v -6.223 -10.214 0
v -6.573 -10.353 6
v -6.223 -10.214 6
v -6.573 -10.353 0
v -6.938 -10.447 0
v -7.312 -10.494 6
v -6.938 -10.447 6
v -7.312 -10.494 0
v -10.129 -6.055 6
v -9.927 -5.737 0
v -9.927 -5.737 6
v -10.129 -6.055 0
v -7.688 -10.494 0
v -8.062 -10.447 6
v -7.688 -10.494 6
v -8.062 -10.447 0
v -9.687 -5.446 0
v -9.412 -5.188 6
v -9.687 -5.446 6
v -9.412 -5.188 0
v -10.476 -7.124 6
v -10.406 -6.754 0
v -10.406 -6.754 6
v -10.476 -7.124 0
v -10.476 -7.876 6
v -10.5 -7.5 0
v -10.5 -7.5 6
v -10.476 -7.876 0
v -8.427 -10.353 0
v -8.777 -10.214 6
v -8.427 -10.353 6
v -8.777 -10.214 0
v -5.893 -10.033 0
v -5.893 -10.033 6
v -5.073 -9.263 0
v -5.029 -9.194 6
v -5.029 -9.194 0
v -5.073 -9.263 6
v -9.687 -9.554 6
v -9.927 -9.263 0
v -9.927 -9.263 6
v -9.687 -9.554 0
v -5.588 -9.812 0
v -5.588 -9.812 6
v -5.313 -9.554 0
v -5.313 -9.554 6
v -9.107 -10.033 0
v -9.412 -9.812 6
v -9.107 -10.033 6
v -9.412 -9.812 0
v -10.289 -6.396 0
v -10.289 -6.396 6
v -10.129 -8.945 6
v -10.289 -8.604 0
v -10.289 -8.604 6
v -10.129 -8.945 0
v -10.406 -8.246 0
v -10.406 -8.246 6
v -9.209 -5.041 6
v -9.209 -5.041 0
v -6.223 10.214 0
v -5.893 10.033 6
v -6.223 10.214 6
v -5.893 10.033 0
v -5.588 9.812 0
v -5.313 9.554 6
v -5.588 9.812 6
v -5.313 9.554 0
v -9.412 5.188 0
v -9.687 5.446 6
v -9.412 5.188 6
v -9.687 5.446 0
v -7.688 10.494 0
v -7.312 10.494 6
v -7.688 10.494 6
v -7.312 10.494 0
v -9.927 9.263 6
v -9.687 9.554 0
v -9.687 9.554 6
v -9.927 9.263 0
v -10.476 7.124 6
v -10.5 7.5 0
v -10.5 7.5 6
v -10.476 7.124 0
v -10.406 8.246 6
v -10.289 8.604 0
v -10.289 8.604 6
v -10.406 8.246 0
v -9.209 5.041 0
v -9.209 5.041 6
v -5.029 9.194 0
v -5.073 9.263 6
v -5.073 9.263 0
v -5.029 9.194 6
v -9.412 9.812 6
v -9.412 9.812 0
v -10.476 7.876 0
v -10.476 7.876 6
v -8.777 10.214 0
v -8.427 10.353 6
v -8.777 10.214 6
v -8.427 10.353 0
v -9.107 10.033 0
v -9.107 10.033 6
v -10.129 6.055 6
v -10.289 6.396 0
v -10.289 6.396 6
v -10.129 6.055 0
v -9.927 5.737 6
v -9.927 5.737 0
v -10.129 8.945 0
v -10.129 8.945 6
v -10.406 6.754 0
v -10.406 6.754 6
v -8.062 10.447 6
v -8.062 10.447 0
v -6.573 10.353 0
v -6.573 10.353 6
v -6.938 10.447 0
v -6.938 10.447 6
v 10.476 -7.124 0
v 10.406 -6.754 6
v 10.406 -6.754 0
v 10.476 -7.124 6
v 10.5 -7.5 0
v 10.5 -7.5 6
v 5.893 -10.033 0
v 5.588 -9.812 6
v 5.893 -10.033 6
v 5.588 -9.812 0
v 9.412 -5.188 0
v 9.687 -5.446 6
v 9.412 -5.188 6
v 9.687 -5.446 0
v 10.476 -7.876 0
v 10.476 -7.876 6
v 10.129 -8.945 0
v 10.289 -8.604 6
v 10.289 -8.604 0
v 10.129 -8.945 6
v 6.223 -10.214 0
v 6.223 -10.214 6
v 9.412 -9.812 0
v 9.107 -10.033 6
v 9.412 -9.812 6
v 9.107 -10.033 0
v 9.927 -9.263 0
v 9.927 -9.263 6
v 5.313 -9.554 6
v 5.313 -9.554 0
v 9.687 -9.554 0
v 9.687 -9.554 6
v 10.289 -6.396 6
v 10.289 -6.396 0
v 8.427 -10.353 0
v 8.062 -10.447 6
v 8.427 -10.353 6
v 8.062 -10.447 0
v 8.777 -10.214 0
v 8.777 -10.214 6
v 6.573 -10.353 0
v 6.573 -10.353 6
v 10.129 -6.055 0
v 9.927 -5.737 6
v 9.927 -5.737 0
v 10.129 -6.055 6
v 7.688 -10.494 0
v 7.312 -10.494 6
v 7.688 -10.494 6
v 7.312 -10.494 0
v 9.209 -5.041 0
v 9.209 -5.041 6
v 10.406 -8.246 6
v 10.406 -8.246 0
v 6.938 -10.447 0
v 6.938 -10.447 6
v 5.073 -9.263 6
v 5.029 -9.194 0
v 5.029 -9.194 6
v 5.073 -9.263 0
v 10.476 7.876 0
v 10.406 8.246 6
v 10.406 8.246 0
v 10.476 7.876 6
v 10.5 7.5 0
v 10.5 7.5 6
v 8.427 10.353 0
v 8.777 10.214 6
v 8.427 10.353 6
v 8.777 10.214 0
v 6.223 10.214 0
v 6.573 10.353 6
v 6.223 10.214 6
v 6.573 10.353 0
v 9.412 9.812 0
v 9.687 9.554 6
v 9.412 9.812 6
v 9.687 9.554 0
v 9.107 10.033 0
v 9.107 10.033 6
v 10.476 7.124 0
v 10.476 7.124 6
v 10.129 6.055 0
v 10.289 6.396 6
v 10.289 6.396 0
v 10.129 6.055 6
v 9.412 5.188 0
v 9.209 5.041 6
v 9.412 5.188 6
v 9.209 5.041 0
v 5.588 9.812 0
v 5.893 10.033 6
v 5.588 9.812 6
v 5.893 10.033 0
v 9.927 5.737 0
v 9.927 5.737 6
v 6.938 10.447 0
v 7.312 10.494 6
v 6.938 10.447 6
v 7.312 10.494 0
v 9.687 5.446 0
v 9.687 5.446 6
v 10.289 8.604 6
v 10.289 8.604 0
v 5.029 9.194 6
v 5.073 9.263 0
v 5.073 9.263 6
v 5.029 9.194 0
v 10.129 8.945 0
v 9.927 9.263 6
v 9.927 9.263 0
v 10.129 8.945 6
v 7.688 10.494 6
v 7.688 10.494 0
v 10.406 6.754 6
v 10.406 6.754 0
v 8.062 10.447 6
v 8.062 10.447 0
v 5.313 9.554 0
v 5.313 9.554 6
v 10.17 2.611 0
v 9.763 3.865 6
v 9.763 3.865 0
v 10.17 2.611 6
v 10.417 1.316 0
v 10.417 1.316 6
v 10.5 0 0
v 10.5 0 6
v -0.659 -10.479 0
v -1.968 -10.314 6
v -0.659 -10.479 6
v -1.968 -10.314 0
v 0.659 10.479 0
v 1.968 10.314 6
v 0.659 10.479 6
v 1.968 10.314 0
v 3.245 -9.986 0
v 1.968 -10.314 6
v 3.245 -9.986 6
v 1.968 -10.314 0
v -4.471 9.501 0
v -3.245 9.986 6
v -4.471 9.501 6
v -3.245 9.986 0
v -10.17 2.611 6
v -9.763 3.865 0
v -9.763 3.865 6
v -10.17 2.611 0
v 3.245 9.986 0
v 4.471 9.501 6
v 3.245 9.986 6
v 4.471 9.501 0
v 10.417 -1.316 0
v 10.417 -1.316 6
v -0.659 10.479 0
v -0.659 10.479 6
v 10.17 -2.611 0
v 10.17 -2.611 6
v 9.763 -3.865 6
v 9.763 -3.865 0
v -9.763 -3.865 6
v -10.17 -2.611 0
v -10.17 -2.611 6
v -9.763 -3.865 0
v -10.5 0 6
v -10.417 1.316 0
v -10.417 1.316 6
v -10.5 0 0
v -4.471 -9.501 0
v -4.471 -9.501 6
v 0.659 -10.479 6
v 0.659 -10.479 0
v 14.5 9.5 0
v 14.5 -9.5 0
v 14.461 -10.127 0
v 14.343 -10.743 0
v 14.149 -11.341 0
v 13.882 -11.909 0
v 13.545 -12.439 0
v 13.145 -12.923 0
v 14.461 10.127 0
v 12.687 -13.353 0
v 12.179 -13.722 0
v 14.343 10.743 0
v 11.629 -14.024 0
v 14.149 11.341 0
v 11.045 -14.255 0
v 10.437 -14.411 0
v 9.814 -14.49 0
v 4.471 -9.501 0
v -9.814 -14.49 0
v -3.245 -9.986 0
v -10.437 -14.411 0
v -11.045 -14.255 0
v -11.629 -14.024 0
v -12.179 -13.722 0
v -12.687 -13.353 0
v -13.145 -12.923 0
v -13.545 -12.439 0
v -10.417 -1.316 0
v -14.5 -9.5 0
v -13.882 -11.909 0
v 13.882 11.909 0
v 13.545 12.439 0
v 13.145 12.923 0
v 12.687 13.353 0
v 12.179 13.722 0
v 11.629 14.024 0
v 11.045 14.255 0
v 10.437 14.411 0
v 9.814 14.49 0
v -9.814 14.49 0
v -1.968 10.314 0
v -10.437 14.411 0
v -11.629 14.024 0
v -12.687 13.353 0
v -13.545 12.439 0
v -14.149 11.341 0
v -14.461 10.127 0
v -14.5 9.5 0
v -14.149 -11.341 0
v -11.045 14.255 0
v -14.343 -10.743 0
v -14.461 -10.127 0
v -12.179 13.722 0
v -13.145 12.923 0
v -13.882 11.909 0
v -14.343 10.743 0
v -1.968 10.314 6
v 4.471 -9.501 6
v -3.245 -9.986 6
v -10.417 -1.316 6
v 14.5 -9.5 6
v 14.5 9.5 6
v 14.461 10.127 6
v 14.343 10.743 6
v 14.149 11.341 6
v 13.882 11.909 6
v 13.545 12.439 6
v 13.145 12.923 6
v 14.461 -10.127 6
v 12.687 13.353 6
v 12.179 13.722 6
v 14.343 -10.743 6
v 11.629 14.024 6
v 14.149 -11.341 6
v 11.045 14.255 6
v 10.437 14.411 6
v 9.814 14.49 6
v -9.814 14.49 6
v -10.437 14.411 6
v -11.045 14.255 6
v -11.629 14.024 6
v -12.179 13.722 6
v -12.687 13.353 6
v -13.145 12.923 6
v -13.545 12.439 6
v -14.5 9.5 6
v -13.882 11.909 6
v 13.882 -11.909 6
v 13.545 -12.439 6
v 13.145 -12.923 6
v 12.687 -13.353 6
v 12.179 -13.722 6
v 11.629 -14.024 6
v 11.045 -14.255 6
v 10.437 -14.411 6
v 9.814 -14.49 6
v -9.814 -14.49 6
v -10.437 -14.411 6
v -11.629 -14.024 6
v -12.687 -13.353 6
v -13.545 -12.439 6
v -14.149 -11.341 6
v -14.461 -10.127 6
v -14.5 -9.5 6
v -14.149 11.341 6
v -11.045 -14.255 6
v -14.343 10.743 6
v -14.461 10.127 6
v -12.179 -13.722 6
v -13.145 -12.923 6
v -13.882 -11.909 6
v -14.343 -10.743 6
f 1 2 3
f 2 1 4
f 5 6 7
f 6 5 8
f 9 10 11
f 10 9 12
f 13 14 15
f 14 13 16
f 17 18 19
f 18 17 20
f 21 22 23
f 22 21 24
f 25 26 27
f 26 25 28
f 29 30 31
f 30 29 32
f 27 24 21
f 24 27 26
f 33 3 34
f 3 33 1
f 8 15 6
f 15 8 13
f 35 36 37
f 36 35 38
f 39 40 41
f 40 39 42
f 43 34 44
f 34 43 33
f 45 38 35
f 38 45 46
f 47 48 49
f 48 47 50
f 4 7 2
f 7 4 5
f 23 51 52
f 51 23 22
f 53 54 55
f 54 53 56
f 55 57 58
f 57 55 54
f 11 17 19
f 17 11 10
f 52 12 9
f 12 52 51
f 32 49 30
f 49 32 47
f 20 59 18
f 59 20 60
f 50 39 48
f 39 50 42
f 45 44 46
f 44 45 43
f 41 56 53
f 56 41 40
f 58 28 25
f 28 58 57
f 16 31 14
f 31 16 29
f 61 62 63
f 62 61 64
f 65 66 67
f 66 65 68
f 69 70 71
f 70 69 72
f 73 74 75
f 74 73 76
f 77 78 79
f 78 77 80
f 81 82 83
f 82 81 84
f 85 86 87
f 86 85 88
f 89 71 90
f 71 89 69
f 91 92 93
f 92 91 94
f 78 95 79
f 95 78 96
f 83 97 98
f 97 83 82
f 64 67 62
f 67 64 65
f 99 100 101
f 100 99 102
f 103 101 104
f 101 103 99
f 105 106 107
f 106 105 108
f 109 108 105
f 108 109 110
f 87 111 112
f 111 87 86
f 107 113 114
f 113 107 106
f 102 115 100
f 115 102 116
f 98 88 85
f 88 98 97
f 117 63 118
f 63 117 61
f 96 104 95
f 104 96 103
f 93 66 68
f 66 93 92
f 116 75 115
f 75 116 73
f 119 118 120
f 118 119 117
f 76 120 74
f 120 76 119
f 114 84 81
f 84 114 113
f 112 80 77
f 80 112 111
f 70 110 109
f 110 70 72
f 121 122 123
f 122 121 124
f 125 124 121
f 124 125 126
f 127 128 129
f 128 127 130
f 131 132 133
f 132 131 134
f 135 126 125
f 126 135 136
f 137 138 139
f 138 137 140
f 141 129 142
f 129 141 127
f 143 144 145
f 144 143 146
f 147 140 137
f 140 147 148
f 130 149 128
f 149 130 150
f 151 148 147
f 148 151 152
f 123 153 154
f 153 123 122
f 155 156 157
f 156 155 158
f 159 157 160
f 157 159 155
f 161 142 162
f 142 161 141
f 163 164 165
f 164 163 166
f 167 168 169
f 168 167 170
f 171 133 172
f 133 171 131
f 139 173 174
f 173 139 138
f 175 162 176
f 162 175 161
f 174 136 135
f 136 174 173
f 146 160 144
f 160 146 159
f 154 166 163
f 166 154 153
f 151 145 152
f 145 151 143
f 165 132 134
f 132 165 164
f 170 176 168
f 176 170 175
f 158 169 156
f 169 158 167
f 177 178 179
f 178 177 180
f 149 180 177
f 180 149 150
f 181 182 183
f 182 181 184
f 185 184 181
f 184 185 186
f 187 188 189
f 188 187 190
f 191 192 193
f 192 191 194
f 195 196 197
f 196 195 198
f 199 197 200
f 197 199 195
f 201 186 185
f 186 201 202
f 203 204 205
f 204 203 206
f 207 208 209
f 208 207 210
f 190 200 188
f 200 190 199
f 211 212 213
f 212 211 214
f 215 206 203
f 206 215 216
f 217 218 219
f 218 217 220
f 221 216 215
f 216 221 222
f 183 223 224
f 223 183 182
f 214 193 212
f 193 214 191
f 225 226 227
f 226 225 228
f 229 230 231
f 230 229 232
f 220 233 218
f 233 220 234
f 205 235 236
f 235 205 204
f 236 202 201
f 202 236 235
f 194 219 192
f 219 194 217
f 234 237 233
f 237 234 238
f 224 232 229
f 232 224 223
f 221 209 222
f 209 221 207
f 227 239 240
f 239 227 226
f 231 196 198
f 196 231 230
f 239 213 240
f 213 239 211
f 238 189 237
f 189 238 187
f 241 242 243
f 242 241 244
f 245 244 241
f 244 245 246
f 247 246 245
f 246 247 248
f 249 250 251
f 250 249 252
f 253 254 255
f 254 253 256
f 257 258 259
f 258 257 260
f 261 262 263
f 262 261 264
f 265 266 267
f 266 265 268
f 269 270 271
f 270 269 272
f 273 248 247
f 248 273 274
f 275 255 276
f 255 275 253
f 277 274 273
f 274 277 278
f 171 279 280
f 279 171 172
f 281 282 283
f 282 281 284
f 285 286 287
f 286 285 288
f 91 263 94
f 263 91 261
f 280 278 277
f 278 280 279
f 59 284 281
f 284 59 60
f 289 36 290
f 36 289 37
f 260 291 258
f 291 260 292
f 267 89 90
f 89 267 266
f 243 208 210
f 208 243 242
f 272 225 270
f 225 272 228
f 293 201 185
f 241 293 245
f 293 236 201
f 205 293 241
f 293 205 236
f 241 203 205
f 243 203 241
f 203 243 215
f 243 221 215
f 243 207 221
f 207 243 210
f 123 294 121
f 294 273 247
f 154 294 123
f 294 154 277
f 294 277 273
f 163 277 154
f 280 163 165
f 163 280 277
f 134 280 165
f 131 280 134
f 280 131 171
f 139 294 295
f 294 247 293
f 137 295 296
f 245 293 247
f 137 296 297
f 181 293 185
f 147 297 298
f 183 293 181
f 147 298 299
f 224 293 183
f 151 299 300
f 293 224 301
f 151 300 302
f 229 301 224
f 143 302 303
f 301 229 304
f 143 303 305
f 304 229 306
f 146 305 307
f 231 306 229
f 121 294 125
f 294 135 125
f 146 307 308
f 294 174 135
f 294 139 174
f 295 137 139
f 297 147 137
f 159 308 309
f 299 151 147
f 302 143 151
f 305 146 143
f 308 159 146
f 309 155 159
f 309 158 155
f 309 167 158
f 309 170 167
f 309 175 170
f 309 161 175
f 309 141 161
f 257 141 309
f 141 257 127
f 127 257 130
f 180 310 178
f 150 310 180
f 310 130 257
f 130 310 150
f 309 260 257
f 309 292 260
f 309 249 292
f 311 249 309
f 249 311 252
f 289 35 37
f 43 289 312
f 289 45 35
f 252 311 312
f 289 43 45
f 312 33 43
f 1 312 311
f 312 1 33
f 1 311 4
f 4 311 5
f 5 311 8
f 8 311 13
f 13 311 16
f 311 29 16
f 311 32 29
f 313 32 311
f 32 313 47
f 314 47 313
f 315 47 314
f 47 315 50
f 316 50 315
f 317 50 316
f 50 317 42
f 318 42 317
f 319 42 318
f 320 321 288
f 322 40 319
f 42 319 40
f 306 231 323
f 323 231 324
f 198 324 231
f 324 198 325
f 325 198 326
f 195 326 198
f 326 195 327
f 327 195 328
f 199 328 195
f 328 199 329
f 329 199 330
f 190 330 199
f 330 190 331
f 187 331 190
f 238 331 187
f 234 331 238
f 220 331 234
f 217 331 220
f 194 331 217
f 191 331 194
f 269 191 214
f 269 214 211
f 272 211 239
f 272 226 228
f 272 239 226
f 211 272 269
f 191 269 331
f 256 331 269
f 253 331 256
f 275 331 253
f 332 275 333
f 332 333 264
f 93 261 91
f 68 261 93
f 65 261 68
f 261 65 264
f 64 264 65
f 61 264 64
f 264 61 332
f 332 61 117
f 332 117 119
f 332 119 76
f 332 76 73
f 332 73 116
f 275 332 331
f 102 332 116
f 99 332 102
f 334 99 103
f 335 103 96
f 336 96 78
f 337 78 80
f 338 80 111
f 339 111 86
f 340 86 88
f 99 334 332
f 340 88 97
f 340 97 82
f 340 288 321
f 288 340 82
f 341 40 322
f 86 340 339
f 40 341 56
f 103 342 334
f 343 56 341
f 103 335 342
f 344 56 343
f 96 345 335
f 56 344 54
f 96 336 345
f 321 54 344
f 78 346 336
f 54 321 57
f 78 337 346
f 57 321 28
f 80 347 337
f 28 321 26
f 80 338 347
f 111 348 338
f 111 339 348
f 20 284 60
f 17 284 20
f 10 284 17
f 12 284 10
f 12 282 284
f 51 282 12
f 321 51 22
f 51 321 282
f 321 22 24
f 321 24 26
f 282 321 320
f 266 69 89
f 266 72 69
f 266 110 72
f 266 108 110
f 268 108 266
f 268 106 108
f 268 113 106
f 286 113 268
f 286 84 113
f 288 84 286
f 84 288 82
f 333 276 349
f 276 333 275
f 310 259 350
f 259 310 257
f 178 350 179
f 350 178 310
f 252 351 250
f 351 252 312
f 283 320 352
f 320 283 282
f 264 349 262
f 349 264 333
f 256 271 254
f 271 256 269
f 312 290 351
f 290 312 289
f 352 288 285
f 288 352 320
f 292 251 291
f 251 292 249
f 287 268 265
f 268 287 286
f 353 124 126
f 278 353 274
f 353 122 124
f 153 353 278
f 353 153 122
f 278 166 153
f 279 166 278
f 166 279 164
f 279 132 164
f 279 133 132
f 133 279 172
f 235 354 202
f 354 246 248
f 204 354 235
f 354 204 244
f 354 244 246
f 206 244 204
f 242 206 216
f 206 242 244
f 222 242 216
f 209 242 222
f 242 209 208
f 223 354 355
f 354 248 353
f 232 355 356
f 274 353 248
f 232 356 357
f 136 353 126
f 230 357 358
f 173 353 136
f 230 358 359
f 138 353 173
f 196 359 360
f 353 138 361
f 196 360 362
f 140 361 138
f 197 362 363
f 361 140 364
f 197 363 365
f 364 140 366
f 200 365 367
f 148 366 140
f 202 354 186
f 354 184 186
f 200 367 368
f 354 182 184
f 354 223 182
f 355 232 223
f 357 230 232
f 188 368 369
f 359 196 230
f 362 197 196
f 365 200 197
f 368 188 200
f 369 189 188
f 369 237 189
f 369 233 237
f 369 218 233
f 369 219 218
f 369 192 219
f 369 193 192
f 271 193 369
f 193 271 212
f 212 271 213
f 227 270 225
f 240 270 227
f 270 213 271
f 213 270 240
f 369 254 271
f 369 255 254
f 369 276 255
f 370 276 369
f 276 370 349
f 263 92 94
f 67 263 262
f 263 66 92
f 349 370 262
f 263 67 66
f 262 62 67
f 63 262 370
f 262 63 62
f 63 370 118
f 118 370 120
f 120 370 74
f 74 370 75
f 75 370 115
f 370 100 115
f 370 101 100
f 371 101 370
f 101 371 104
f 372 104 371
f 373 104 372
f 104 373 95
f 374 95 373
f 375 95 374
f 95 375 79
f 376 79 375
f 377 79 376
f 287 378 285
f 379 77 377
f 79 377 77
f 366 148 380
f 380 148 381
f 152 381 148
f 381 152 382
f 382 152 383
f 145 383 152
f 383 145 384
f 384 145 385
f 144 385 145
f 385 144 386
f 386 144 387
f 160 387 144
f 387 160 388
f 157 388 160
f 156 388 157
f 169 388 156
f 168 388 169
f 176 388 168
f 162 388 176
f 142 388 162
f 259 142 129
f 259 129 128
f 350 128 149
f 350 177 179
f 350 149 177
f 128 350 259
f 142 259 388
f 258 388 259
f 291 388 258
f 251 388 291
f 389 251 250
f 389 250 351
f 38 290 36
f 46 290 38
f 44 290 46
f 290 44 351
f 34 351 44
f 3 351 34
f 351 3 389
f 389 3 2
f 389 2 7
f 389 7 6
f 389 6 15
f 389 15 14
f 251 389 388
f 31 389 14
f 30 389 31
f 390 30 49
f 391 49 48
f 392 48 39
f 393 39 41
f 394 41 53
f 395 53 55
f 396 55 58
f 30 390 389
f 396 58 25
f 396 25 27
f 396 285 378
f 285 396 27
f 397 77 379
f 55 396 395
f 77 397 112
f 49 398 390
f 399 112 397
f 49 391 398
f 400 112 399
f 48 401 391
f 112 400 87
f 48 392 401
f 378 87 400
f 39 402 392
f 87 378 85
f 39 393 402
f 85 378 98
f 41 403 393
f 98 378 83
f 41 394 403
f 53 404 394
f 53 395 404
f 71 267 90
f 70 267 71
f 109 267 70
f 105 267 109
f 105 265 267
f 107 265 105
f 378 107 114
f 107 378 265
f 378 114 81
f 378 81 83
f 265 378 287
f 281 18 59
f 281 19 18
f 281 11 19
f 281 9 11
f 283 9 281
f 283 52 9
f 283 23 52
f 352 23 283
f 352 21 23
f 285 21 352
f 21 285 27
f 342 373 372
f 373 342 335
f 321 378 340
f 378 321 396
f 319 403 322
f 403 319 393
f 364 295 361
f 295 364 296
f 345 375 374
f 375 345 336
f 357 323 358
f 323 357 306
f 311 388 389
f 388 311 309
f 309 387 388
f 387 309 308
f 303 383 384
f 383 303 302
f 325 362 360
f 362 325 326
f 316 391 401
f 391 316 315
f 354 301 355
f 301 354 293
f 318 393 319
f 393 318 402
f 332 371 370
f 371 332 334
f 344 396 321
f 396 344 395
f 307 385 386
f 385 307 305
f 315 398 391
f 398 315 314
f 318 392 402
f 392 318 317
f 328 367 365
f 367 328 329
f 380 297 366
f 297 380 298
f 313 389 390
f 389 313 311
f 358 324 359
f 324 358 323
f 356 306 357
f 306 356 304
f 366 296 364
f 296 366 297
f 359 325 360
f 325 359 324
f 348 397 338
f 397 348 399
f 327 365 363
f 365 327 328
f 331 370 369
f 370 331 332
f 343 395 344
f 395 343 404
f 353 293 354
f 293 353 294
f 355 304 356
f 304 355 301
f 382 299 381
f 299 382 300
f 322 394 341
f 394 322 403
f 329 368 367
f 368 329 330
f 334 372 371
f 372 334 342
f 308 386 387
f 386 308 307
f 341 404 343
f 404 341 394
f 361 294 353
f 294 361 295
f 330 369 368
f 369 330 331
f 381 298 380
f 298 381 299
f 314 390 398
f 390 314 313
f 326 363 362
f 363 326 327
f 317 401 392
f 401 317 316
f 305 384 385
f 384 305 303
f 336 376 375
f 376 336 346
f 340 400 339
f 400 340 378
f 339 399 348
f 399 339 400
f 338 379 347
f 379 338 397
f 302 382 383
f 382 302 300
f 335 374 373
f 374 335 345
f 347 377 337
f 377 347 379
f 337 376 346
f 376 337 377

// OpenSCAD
$fn = 50;


difference() {
	union() {
		hull() {
			translate(v = [-9.5000000000, 9.5000000000, 0]) {
				cylinder(h = 6, r = 5);
			}
			translate(v = [9.5000000000, 9.5000000000, 0]) {
				cylinder(h = 6, r = 5);
			}
			translate(v = [-9.5000000000, -9.5000000000, 0]) {
				cylinder(h = 6, r = 5);
			}
			translate(v = [9.5000000000, -9.5000000000, 0]) {
				cylinder(h = 6, r = 5);
			}
		}
	}
	union() {
		#translate(v = [-7.5000000000, -7.5000000000, -100.0000000000]) {
			cylinder(h = 200, r = 3.0000000000);
		}
		#translate(v = [-7.5000000000, 7.5000000000, -100.0000000000]) {
			cylinder(h = 200, r = 3.0000000000);
		}
		#translate(v = [7.5000000000, -7.5000000000, -100.0000000000]) {
			cylinder(h = 200, r = 3.0000000000);
		}
		#translate(v = [7.5000000000, 7.5000000000, -100.0000000000]) {
			cylinder(h = 200, r = 3.0000000000);
		}
		#cylinder(h = 6, r = 10.5000000000);
	}
}
